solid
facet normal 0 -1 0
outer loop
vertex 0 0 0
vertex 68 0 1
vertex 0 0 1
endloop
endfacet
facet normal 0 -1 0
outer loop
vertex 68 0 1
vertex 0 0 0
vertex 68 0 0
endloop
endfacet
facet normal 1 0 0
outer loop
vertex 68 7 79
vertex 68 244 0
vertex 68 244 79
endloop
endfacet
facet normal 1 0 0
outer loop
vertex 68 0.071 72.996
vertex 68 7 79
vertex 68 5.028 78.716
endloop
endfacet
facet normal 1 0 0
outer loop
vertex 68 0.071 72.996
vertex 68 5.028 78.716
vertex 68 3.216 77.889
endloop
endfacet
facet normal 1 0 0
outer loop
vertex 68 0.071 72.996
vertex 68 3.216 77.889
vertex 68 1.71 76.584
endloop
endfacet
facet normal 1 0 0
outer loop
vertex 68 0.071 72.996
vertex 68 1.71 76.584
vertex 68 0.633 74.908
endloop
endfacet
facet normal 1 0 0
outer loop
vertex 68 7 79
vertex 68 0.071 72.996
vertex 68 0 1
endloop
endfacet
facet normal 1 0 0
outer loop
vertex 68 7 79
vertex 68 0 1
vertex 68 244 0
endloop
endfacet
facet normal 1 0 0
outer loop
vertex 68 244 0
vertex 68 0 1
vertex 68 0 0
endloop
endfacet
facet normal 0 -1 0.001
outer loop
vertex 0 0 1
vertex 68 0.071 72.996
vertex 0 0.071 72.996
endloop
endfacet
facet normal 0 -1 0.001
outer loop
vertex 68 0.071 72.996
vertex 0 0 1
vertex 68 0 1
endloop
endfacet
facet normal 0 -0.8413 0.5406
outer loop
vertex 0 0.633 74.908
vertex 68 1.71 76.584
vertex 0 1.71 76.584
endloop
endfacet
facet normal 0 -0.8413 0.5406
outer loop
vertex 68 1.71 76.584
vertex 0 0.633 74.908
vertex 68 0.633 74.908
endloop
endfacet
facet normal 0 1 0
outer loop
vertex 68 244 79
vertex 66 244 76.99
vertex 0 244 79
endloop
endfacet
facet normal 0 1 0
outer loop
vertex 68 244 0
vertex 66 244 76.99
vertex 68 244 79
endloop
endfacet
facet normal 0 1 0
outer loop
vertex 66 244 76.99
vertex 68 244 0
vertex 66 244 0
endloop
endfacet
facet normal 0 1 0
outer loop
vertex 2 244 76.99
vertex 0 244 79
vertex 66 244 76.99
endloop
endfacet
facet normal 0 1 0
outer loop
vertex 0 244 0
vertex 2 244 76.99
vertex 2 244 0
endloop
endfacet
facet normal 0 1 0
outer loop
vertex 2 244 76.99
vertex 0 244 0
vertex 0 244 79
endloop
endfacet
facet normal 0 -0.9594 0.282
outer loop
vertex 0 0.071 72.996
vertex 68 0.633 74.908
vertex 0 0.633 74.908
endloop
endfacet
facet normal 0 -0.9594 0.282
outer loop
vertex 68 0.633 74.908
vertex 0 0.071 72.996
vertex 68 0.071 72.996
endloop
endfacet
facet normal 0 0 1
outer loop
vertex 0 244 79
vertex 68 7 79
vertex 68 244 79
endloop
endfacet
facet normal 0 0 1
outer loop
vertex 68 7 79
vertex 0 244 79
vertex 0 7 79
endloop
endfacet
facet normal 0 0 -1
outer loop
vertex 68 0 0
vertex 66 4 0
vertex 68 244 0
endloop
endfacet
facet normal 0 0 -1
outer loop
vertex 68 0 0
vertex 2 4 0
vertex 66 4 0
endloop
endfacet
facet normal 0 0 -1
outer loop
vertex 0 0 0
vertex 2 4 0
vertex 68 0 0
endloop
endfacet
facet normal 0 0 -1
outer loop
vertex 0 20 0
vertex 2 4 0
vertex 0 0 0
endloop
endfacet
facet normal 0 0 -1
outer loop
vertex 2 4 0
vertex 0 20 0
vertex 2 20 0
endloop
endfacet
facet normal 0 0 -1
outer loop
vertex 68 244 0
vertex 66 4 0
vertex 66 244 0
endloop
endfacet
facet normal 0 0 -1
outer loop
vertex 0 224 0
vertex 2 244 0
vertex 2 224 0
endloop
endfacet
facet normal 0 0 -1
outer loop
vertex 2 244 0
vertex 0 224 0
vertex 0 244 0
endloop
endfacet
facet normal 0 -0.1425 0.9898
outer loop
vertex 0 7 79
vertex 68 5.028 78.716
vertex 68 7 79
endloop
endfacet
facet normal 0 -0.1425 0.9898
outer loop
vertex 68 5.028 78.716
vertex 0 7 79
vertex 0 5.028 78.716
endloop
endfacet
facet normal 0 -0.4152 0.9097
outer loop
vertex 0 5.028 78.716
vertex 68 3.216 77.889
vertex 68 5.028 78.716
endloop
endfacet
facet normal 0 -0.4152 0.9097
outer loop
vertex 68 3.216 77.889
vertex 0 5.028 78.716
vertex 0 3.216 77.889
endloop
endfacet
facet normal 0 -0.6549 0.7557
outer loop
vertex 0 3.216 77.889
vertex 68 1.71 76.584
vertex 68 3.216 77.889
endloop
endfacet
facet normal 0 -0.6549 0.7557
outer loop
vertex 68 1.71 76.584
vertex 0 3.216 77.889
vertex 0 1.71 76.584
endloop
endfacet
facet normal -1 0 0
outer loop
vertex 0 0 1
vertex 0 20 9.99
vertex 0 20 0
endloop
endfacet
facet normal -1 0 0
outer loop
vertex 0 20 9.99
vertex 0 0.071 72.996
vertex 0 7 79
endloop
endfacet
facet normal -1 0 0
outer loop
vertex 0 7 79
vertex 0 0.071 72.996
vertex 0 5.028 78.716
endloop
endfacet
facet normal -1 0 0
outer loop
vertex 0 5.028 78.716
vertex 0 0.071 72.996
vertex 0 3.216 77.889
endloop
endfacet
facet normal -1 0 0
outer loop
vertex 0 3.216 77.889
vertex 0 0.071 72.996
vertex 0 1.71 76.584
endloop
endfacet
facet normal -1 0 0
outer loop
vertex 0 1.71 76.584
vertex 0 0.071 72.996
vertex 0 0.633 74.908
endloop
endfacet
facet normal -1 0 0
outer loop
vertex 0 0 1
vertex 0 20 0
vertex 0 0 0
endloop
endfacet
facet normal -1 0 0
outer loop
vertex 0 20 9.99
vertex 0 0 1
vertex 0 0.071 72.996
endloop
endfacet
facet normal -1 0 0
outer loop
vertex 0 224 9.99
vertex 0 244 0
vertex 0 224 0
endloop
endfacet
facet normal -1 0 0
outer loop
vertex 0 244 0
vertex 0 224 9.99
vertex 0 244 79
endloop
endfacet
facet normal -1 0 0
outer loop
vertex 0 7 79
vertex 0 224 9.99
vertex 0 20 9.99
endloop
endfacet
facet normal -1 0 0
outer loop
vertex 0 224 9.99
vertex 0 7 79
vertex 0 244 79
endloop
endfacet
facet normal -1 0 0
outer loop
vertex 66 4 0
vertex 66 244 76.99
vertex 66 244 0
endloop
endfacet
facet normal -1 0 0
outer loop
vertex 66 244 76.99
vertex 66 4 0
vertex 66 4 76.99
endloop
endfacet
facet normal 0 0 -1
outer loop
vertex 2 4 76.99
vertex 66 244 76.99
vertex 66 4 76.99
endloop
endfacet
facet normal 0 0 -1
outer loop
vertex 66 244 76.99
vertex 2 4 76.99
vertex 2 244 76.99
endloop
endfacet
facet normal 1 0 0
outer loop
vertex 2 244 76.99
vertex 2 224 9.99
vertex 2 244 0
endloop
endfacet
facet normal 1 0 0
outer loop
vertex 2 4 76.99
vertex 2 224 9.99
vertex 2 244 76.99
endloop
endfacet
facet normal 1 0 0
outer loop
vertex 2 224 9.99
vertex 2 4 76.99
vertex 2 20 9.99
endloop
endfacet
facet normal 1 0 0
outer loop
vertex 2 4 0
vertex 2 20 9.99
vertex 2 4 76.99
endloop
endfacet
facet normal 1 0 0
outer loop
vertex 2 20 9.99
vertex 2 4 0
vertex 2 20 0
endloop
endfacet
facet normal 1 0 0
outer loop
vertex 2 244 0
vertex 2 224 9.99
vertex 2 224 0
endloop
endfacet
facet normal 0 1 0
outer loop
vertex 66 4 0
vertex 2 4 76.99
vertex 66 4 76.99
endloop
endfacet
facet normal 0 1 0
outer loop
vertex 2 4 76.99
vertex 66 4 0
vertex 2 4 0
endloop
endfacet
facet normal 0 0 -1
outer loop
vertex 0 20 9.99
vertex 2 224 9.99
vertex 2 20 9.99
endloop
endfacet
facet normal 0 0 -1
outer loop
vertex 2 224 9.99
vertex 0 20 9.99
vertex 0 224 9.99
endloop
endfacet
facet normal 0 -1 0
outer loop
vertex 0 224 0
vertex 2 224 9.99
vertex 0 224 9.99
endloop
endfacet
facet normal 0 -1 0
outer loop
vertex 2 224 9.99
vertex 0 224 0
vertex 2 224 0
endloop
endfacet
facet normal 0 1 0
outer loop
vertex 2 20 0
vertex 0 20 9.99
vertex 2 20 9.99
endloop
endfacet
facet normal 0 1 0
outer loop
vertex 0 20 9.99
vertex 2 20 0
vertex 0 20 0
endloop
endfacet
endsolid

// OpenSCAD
// Parameters
length = 244;      
width = 68;
height = 79;
wall = 2;       // Wall thickness
fillet_radius = 7;
ribbon_height = 10;
pass_through_leg_width = 20;

// Shape with cable pass through
difference() {

    // Hollow shape, but missing cable pass through
    difference() {
        // Non-hollow shape
        hull() {   
            // Far end area 
            translate([0, length-wall, 0]) cube([width, wall, height]);

            // Base area
            cube([width, length, 1]); 

            // Nice fillet edge at front
            translate([0, fillet_radius, height-fillet_radius]) {
                rotate([0, 90, 0]) 
                cylinder(width, fillet_radius, fillet_radius);
            }
        }

        translate([wall, wall*2, -0.01])
        cube([width-wall*2, length, height-wall]);
    }

    // Ribbon cable pass through 
    translate([-wall, pass_through_leg_width, -0.01])
    cube([wall*3, length-pass_through_leg_width*2, ribbon_height]);

}
